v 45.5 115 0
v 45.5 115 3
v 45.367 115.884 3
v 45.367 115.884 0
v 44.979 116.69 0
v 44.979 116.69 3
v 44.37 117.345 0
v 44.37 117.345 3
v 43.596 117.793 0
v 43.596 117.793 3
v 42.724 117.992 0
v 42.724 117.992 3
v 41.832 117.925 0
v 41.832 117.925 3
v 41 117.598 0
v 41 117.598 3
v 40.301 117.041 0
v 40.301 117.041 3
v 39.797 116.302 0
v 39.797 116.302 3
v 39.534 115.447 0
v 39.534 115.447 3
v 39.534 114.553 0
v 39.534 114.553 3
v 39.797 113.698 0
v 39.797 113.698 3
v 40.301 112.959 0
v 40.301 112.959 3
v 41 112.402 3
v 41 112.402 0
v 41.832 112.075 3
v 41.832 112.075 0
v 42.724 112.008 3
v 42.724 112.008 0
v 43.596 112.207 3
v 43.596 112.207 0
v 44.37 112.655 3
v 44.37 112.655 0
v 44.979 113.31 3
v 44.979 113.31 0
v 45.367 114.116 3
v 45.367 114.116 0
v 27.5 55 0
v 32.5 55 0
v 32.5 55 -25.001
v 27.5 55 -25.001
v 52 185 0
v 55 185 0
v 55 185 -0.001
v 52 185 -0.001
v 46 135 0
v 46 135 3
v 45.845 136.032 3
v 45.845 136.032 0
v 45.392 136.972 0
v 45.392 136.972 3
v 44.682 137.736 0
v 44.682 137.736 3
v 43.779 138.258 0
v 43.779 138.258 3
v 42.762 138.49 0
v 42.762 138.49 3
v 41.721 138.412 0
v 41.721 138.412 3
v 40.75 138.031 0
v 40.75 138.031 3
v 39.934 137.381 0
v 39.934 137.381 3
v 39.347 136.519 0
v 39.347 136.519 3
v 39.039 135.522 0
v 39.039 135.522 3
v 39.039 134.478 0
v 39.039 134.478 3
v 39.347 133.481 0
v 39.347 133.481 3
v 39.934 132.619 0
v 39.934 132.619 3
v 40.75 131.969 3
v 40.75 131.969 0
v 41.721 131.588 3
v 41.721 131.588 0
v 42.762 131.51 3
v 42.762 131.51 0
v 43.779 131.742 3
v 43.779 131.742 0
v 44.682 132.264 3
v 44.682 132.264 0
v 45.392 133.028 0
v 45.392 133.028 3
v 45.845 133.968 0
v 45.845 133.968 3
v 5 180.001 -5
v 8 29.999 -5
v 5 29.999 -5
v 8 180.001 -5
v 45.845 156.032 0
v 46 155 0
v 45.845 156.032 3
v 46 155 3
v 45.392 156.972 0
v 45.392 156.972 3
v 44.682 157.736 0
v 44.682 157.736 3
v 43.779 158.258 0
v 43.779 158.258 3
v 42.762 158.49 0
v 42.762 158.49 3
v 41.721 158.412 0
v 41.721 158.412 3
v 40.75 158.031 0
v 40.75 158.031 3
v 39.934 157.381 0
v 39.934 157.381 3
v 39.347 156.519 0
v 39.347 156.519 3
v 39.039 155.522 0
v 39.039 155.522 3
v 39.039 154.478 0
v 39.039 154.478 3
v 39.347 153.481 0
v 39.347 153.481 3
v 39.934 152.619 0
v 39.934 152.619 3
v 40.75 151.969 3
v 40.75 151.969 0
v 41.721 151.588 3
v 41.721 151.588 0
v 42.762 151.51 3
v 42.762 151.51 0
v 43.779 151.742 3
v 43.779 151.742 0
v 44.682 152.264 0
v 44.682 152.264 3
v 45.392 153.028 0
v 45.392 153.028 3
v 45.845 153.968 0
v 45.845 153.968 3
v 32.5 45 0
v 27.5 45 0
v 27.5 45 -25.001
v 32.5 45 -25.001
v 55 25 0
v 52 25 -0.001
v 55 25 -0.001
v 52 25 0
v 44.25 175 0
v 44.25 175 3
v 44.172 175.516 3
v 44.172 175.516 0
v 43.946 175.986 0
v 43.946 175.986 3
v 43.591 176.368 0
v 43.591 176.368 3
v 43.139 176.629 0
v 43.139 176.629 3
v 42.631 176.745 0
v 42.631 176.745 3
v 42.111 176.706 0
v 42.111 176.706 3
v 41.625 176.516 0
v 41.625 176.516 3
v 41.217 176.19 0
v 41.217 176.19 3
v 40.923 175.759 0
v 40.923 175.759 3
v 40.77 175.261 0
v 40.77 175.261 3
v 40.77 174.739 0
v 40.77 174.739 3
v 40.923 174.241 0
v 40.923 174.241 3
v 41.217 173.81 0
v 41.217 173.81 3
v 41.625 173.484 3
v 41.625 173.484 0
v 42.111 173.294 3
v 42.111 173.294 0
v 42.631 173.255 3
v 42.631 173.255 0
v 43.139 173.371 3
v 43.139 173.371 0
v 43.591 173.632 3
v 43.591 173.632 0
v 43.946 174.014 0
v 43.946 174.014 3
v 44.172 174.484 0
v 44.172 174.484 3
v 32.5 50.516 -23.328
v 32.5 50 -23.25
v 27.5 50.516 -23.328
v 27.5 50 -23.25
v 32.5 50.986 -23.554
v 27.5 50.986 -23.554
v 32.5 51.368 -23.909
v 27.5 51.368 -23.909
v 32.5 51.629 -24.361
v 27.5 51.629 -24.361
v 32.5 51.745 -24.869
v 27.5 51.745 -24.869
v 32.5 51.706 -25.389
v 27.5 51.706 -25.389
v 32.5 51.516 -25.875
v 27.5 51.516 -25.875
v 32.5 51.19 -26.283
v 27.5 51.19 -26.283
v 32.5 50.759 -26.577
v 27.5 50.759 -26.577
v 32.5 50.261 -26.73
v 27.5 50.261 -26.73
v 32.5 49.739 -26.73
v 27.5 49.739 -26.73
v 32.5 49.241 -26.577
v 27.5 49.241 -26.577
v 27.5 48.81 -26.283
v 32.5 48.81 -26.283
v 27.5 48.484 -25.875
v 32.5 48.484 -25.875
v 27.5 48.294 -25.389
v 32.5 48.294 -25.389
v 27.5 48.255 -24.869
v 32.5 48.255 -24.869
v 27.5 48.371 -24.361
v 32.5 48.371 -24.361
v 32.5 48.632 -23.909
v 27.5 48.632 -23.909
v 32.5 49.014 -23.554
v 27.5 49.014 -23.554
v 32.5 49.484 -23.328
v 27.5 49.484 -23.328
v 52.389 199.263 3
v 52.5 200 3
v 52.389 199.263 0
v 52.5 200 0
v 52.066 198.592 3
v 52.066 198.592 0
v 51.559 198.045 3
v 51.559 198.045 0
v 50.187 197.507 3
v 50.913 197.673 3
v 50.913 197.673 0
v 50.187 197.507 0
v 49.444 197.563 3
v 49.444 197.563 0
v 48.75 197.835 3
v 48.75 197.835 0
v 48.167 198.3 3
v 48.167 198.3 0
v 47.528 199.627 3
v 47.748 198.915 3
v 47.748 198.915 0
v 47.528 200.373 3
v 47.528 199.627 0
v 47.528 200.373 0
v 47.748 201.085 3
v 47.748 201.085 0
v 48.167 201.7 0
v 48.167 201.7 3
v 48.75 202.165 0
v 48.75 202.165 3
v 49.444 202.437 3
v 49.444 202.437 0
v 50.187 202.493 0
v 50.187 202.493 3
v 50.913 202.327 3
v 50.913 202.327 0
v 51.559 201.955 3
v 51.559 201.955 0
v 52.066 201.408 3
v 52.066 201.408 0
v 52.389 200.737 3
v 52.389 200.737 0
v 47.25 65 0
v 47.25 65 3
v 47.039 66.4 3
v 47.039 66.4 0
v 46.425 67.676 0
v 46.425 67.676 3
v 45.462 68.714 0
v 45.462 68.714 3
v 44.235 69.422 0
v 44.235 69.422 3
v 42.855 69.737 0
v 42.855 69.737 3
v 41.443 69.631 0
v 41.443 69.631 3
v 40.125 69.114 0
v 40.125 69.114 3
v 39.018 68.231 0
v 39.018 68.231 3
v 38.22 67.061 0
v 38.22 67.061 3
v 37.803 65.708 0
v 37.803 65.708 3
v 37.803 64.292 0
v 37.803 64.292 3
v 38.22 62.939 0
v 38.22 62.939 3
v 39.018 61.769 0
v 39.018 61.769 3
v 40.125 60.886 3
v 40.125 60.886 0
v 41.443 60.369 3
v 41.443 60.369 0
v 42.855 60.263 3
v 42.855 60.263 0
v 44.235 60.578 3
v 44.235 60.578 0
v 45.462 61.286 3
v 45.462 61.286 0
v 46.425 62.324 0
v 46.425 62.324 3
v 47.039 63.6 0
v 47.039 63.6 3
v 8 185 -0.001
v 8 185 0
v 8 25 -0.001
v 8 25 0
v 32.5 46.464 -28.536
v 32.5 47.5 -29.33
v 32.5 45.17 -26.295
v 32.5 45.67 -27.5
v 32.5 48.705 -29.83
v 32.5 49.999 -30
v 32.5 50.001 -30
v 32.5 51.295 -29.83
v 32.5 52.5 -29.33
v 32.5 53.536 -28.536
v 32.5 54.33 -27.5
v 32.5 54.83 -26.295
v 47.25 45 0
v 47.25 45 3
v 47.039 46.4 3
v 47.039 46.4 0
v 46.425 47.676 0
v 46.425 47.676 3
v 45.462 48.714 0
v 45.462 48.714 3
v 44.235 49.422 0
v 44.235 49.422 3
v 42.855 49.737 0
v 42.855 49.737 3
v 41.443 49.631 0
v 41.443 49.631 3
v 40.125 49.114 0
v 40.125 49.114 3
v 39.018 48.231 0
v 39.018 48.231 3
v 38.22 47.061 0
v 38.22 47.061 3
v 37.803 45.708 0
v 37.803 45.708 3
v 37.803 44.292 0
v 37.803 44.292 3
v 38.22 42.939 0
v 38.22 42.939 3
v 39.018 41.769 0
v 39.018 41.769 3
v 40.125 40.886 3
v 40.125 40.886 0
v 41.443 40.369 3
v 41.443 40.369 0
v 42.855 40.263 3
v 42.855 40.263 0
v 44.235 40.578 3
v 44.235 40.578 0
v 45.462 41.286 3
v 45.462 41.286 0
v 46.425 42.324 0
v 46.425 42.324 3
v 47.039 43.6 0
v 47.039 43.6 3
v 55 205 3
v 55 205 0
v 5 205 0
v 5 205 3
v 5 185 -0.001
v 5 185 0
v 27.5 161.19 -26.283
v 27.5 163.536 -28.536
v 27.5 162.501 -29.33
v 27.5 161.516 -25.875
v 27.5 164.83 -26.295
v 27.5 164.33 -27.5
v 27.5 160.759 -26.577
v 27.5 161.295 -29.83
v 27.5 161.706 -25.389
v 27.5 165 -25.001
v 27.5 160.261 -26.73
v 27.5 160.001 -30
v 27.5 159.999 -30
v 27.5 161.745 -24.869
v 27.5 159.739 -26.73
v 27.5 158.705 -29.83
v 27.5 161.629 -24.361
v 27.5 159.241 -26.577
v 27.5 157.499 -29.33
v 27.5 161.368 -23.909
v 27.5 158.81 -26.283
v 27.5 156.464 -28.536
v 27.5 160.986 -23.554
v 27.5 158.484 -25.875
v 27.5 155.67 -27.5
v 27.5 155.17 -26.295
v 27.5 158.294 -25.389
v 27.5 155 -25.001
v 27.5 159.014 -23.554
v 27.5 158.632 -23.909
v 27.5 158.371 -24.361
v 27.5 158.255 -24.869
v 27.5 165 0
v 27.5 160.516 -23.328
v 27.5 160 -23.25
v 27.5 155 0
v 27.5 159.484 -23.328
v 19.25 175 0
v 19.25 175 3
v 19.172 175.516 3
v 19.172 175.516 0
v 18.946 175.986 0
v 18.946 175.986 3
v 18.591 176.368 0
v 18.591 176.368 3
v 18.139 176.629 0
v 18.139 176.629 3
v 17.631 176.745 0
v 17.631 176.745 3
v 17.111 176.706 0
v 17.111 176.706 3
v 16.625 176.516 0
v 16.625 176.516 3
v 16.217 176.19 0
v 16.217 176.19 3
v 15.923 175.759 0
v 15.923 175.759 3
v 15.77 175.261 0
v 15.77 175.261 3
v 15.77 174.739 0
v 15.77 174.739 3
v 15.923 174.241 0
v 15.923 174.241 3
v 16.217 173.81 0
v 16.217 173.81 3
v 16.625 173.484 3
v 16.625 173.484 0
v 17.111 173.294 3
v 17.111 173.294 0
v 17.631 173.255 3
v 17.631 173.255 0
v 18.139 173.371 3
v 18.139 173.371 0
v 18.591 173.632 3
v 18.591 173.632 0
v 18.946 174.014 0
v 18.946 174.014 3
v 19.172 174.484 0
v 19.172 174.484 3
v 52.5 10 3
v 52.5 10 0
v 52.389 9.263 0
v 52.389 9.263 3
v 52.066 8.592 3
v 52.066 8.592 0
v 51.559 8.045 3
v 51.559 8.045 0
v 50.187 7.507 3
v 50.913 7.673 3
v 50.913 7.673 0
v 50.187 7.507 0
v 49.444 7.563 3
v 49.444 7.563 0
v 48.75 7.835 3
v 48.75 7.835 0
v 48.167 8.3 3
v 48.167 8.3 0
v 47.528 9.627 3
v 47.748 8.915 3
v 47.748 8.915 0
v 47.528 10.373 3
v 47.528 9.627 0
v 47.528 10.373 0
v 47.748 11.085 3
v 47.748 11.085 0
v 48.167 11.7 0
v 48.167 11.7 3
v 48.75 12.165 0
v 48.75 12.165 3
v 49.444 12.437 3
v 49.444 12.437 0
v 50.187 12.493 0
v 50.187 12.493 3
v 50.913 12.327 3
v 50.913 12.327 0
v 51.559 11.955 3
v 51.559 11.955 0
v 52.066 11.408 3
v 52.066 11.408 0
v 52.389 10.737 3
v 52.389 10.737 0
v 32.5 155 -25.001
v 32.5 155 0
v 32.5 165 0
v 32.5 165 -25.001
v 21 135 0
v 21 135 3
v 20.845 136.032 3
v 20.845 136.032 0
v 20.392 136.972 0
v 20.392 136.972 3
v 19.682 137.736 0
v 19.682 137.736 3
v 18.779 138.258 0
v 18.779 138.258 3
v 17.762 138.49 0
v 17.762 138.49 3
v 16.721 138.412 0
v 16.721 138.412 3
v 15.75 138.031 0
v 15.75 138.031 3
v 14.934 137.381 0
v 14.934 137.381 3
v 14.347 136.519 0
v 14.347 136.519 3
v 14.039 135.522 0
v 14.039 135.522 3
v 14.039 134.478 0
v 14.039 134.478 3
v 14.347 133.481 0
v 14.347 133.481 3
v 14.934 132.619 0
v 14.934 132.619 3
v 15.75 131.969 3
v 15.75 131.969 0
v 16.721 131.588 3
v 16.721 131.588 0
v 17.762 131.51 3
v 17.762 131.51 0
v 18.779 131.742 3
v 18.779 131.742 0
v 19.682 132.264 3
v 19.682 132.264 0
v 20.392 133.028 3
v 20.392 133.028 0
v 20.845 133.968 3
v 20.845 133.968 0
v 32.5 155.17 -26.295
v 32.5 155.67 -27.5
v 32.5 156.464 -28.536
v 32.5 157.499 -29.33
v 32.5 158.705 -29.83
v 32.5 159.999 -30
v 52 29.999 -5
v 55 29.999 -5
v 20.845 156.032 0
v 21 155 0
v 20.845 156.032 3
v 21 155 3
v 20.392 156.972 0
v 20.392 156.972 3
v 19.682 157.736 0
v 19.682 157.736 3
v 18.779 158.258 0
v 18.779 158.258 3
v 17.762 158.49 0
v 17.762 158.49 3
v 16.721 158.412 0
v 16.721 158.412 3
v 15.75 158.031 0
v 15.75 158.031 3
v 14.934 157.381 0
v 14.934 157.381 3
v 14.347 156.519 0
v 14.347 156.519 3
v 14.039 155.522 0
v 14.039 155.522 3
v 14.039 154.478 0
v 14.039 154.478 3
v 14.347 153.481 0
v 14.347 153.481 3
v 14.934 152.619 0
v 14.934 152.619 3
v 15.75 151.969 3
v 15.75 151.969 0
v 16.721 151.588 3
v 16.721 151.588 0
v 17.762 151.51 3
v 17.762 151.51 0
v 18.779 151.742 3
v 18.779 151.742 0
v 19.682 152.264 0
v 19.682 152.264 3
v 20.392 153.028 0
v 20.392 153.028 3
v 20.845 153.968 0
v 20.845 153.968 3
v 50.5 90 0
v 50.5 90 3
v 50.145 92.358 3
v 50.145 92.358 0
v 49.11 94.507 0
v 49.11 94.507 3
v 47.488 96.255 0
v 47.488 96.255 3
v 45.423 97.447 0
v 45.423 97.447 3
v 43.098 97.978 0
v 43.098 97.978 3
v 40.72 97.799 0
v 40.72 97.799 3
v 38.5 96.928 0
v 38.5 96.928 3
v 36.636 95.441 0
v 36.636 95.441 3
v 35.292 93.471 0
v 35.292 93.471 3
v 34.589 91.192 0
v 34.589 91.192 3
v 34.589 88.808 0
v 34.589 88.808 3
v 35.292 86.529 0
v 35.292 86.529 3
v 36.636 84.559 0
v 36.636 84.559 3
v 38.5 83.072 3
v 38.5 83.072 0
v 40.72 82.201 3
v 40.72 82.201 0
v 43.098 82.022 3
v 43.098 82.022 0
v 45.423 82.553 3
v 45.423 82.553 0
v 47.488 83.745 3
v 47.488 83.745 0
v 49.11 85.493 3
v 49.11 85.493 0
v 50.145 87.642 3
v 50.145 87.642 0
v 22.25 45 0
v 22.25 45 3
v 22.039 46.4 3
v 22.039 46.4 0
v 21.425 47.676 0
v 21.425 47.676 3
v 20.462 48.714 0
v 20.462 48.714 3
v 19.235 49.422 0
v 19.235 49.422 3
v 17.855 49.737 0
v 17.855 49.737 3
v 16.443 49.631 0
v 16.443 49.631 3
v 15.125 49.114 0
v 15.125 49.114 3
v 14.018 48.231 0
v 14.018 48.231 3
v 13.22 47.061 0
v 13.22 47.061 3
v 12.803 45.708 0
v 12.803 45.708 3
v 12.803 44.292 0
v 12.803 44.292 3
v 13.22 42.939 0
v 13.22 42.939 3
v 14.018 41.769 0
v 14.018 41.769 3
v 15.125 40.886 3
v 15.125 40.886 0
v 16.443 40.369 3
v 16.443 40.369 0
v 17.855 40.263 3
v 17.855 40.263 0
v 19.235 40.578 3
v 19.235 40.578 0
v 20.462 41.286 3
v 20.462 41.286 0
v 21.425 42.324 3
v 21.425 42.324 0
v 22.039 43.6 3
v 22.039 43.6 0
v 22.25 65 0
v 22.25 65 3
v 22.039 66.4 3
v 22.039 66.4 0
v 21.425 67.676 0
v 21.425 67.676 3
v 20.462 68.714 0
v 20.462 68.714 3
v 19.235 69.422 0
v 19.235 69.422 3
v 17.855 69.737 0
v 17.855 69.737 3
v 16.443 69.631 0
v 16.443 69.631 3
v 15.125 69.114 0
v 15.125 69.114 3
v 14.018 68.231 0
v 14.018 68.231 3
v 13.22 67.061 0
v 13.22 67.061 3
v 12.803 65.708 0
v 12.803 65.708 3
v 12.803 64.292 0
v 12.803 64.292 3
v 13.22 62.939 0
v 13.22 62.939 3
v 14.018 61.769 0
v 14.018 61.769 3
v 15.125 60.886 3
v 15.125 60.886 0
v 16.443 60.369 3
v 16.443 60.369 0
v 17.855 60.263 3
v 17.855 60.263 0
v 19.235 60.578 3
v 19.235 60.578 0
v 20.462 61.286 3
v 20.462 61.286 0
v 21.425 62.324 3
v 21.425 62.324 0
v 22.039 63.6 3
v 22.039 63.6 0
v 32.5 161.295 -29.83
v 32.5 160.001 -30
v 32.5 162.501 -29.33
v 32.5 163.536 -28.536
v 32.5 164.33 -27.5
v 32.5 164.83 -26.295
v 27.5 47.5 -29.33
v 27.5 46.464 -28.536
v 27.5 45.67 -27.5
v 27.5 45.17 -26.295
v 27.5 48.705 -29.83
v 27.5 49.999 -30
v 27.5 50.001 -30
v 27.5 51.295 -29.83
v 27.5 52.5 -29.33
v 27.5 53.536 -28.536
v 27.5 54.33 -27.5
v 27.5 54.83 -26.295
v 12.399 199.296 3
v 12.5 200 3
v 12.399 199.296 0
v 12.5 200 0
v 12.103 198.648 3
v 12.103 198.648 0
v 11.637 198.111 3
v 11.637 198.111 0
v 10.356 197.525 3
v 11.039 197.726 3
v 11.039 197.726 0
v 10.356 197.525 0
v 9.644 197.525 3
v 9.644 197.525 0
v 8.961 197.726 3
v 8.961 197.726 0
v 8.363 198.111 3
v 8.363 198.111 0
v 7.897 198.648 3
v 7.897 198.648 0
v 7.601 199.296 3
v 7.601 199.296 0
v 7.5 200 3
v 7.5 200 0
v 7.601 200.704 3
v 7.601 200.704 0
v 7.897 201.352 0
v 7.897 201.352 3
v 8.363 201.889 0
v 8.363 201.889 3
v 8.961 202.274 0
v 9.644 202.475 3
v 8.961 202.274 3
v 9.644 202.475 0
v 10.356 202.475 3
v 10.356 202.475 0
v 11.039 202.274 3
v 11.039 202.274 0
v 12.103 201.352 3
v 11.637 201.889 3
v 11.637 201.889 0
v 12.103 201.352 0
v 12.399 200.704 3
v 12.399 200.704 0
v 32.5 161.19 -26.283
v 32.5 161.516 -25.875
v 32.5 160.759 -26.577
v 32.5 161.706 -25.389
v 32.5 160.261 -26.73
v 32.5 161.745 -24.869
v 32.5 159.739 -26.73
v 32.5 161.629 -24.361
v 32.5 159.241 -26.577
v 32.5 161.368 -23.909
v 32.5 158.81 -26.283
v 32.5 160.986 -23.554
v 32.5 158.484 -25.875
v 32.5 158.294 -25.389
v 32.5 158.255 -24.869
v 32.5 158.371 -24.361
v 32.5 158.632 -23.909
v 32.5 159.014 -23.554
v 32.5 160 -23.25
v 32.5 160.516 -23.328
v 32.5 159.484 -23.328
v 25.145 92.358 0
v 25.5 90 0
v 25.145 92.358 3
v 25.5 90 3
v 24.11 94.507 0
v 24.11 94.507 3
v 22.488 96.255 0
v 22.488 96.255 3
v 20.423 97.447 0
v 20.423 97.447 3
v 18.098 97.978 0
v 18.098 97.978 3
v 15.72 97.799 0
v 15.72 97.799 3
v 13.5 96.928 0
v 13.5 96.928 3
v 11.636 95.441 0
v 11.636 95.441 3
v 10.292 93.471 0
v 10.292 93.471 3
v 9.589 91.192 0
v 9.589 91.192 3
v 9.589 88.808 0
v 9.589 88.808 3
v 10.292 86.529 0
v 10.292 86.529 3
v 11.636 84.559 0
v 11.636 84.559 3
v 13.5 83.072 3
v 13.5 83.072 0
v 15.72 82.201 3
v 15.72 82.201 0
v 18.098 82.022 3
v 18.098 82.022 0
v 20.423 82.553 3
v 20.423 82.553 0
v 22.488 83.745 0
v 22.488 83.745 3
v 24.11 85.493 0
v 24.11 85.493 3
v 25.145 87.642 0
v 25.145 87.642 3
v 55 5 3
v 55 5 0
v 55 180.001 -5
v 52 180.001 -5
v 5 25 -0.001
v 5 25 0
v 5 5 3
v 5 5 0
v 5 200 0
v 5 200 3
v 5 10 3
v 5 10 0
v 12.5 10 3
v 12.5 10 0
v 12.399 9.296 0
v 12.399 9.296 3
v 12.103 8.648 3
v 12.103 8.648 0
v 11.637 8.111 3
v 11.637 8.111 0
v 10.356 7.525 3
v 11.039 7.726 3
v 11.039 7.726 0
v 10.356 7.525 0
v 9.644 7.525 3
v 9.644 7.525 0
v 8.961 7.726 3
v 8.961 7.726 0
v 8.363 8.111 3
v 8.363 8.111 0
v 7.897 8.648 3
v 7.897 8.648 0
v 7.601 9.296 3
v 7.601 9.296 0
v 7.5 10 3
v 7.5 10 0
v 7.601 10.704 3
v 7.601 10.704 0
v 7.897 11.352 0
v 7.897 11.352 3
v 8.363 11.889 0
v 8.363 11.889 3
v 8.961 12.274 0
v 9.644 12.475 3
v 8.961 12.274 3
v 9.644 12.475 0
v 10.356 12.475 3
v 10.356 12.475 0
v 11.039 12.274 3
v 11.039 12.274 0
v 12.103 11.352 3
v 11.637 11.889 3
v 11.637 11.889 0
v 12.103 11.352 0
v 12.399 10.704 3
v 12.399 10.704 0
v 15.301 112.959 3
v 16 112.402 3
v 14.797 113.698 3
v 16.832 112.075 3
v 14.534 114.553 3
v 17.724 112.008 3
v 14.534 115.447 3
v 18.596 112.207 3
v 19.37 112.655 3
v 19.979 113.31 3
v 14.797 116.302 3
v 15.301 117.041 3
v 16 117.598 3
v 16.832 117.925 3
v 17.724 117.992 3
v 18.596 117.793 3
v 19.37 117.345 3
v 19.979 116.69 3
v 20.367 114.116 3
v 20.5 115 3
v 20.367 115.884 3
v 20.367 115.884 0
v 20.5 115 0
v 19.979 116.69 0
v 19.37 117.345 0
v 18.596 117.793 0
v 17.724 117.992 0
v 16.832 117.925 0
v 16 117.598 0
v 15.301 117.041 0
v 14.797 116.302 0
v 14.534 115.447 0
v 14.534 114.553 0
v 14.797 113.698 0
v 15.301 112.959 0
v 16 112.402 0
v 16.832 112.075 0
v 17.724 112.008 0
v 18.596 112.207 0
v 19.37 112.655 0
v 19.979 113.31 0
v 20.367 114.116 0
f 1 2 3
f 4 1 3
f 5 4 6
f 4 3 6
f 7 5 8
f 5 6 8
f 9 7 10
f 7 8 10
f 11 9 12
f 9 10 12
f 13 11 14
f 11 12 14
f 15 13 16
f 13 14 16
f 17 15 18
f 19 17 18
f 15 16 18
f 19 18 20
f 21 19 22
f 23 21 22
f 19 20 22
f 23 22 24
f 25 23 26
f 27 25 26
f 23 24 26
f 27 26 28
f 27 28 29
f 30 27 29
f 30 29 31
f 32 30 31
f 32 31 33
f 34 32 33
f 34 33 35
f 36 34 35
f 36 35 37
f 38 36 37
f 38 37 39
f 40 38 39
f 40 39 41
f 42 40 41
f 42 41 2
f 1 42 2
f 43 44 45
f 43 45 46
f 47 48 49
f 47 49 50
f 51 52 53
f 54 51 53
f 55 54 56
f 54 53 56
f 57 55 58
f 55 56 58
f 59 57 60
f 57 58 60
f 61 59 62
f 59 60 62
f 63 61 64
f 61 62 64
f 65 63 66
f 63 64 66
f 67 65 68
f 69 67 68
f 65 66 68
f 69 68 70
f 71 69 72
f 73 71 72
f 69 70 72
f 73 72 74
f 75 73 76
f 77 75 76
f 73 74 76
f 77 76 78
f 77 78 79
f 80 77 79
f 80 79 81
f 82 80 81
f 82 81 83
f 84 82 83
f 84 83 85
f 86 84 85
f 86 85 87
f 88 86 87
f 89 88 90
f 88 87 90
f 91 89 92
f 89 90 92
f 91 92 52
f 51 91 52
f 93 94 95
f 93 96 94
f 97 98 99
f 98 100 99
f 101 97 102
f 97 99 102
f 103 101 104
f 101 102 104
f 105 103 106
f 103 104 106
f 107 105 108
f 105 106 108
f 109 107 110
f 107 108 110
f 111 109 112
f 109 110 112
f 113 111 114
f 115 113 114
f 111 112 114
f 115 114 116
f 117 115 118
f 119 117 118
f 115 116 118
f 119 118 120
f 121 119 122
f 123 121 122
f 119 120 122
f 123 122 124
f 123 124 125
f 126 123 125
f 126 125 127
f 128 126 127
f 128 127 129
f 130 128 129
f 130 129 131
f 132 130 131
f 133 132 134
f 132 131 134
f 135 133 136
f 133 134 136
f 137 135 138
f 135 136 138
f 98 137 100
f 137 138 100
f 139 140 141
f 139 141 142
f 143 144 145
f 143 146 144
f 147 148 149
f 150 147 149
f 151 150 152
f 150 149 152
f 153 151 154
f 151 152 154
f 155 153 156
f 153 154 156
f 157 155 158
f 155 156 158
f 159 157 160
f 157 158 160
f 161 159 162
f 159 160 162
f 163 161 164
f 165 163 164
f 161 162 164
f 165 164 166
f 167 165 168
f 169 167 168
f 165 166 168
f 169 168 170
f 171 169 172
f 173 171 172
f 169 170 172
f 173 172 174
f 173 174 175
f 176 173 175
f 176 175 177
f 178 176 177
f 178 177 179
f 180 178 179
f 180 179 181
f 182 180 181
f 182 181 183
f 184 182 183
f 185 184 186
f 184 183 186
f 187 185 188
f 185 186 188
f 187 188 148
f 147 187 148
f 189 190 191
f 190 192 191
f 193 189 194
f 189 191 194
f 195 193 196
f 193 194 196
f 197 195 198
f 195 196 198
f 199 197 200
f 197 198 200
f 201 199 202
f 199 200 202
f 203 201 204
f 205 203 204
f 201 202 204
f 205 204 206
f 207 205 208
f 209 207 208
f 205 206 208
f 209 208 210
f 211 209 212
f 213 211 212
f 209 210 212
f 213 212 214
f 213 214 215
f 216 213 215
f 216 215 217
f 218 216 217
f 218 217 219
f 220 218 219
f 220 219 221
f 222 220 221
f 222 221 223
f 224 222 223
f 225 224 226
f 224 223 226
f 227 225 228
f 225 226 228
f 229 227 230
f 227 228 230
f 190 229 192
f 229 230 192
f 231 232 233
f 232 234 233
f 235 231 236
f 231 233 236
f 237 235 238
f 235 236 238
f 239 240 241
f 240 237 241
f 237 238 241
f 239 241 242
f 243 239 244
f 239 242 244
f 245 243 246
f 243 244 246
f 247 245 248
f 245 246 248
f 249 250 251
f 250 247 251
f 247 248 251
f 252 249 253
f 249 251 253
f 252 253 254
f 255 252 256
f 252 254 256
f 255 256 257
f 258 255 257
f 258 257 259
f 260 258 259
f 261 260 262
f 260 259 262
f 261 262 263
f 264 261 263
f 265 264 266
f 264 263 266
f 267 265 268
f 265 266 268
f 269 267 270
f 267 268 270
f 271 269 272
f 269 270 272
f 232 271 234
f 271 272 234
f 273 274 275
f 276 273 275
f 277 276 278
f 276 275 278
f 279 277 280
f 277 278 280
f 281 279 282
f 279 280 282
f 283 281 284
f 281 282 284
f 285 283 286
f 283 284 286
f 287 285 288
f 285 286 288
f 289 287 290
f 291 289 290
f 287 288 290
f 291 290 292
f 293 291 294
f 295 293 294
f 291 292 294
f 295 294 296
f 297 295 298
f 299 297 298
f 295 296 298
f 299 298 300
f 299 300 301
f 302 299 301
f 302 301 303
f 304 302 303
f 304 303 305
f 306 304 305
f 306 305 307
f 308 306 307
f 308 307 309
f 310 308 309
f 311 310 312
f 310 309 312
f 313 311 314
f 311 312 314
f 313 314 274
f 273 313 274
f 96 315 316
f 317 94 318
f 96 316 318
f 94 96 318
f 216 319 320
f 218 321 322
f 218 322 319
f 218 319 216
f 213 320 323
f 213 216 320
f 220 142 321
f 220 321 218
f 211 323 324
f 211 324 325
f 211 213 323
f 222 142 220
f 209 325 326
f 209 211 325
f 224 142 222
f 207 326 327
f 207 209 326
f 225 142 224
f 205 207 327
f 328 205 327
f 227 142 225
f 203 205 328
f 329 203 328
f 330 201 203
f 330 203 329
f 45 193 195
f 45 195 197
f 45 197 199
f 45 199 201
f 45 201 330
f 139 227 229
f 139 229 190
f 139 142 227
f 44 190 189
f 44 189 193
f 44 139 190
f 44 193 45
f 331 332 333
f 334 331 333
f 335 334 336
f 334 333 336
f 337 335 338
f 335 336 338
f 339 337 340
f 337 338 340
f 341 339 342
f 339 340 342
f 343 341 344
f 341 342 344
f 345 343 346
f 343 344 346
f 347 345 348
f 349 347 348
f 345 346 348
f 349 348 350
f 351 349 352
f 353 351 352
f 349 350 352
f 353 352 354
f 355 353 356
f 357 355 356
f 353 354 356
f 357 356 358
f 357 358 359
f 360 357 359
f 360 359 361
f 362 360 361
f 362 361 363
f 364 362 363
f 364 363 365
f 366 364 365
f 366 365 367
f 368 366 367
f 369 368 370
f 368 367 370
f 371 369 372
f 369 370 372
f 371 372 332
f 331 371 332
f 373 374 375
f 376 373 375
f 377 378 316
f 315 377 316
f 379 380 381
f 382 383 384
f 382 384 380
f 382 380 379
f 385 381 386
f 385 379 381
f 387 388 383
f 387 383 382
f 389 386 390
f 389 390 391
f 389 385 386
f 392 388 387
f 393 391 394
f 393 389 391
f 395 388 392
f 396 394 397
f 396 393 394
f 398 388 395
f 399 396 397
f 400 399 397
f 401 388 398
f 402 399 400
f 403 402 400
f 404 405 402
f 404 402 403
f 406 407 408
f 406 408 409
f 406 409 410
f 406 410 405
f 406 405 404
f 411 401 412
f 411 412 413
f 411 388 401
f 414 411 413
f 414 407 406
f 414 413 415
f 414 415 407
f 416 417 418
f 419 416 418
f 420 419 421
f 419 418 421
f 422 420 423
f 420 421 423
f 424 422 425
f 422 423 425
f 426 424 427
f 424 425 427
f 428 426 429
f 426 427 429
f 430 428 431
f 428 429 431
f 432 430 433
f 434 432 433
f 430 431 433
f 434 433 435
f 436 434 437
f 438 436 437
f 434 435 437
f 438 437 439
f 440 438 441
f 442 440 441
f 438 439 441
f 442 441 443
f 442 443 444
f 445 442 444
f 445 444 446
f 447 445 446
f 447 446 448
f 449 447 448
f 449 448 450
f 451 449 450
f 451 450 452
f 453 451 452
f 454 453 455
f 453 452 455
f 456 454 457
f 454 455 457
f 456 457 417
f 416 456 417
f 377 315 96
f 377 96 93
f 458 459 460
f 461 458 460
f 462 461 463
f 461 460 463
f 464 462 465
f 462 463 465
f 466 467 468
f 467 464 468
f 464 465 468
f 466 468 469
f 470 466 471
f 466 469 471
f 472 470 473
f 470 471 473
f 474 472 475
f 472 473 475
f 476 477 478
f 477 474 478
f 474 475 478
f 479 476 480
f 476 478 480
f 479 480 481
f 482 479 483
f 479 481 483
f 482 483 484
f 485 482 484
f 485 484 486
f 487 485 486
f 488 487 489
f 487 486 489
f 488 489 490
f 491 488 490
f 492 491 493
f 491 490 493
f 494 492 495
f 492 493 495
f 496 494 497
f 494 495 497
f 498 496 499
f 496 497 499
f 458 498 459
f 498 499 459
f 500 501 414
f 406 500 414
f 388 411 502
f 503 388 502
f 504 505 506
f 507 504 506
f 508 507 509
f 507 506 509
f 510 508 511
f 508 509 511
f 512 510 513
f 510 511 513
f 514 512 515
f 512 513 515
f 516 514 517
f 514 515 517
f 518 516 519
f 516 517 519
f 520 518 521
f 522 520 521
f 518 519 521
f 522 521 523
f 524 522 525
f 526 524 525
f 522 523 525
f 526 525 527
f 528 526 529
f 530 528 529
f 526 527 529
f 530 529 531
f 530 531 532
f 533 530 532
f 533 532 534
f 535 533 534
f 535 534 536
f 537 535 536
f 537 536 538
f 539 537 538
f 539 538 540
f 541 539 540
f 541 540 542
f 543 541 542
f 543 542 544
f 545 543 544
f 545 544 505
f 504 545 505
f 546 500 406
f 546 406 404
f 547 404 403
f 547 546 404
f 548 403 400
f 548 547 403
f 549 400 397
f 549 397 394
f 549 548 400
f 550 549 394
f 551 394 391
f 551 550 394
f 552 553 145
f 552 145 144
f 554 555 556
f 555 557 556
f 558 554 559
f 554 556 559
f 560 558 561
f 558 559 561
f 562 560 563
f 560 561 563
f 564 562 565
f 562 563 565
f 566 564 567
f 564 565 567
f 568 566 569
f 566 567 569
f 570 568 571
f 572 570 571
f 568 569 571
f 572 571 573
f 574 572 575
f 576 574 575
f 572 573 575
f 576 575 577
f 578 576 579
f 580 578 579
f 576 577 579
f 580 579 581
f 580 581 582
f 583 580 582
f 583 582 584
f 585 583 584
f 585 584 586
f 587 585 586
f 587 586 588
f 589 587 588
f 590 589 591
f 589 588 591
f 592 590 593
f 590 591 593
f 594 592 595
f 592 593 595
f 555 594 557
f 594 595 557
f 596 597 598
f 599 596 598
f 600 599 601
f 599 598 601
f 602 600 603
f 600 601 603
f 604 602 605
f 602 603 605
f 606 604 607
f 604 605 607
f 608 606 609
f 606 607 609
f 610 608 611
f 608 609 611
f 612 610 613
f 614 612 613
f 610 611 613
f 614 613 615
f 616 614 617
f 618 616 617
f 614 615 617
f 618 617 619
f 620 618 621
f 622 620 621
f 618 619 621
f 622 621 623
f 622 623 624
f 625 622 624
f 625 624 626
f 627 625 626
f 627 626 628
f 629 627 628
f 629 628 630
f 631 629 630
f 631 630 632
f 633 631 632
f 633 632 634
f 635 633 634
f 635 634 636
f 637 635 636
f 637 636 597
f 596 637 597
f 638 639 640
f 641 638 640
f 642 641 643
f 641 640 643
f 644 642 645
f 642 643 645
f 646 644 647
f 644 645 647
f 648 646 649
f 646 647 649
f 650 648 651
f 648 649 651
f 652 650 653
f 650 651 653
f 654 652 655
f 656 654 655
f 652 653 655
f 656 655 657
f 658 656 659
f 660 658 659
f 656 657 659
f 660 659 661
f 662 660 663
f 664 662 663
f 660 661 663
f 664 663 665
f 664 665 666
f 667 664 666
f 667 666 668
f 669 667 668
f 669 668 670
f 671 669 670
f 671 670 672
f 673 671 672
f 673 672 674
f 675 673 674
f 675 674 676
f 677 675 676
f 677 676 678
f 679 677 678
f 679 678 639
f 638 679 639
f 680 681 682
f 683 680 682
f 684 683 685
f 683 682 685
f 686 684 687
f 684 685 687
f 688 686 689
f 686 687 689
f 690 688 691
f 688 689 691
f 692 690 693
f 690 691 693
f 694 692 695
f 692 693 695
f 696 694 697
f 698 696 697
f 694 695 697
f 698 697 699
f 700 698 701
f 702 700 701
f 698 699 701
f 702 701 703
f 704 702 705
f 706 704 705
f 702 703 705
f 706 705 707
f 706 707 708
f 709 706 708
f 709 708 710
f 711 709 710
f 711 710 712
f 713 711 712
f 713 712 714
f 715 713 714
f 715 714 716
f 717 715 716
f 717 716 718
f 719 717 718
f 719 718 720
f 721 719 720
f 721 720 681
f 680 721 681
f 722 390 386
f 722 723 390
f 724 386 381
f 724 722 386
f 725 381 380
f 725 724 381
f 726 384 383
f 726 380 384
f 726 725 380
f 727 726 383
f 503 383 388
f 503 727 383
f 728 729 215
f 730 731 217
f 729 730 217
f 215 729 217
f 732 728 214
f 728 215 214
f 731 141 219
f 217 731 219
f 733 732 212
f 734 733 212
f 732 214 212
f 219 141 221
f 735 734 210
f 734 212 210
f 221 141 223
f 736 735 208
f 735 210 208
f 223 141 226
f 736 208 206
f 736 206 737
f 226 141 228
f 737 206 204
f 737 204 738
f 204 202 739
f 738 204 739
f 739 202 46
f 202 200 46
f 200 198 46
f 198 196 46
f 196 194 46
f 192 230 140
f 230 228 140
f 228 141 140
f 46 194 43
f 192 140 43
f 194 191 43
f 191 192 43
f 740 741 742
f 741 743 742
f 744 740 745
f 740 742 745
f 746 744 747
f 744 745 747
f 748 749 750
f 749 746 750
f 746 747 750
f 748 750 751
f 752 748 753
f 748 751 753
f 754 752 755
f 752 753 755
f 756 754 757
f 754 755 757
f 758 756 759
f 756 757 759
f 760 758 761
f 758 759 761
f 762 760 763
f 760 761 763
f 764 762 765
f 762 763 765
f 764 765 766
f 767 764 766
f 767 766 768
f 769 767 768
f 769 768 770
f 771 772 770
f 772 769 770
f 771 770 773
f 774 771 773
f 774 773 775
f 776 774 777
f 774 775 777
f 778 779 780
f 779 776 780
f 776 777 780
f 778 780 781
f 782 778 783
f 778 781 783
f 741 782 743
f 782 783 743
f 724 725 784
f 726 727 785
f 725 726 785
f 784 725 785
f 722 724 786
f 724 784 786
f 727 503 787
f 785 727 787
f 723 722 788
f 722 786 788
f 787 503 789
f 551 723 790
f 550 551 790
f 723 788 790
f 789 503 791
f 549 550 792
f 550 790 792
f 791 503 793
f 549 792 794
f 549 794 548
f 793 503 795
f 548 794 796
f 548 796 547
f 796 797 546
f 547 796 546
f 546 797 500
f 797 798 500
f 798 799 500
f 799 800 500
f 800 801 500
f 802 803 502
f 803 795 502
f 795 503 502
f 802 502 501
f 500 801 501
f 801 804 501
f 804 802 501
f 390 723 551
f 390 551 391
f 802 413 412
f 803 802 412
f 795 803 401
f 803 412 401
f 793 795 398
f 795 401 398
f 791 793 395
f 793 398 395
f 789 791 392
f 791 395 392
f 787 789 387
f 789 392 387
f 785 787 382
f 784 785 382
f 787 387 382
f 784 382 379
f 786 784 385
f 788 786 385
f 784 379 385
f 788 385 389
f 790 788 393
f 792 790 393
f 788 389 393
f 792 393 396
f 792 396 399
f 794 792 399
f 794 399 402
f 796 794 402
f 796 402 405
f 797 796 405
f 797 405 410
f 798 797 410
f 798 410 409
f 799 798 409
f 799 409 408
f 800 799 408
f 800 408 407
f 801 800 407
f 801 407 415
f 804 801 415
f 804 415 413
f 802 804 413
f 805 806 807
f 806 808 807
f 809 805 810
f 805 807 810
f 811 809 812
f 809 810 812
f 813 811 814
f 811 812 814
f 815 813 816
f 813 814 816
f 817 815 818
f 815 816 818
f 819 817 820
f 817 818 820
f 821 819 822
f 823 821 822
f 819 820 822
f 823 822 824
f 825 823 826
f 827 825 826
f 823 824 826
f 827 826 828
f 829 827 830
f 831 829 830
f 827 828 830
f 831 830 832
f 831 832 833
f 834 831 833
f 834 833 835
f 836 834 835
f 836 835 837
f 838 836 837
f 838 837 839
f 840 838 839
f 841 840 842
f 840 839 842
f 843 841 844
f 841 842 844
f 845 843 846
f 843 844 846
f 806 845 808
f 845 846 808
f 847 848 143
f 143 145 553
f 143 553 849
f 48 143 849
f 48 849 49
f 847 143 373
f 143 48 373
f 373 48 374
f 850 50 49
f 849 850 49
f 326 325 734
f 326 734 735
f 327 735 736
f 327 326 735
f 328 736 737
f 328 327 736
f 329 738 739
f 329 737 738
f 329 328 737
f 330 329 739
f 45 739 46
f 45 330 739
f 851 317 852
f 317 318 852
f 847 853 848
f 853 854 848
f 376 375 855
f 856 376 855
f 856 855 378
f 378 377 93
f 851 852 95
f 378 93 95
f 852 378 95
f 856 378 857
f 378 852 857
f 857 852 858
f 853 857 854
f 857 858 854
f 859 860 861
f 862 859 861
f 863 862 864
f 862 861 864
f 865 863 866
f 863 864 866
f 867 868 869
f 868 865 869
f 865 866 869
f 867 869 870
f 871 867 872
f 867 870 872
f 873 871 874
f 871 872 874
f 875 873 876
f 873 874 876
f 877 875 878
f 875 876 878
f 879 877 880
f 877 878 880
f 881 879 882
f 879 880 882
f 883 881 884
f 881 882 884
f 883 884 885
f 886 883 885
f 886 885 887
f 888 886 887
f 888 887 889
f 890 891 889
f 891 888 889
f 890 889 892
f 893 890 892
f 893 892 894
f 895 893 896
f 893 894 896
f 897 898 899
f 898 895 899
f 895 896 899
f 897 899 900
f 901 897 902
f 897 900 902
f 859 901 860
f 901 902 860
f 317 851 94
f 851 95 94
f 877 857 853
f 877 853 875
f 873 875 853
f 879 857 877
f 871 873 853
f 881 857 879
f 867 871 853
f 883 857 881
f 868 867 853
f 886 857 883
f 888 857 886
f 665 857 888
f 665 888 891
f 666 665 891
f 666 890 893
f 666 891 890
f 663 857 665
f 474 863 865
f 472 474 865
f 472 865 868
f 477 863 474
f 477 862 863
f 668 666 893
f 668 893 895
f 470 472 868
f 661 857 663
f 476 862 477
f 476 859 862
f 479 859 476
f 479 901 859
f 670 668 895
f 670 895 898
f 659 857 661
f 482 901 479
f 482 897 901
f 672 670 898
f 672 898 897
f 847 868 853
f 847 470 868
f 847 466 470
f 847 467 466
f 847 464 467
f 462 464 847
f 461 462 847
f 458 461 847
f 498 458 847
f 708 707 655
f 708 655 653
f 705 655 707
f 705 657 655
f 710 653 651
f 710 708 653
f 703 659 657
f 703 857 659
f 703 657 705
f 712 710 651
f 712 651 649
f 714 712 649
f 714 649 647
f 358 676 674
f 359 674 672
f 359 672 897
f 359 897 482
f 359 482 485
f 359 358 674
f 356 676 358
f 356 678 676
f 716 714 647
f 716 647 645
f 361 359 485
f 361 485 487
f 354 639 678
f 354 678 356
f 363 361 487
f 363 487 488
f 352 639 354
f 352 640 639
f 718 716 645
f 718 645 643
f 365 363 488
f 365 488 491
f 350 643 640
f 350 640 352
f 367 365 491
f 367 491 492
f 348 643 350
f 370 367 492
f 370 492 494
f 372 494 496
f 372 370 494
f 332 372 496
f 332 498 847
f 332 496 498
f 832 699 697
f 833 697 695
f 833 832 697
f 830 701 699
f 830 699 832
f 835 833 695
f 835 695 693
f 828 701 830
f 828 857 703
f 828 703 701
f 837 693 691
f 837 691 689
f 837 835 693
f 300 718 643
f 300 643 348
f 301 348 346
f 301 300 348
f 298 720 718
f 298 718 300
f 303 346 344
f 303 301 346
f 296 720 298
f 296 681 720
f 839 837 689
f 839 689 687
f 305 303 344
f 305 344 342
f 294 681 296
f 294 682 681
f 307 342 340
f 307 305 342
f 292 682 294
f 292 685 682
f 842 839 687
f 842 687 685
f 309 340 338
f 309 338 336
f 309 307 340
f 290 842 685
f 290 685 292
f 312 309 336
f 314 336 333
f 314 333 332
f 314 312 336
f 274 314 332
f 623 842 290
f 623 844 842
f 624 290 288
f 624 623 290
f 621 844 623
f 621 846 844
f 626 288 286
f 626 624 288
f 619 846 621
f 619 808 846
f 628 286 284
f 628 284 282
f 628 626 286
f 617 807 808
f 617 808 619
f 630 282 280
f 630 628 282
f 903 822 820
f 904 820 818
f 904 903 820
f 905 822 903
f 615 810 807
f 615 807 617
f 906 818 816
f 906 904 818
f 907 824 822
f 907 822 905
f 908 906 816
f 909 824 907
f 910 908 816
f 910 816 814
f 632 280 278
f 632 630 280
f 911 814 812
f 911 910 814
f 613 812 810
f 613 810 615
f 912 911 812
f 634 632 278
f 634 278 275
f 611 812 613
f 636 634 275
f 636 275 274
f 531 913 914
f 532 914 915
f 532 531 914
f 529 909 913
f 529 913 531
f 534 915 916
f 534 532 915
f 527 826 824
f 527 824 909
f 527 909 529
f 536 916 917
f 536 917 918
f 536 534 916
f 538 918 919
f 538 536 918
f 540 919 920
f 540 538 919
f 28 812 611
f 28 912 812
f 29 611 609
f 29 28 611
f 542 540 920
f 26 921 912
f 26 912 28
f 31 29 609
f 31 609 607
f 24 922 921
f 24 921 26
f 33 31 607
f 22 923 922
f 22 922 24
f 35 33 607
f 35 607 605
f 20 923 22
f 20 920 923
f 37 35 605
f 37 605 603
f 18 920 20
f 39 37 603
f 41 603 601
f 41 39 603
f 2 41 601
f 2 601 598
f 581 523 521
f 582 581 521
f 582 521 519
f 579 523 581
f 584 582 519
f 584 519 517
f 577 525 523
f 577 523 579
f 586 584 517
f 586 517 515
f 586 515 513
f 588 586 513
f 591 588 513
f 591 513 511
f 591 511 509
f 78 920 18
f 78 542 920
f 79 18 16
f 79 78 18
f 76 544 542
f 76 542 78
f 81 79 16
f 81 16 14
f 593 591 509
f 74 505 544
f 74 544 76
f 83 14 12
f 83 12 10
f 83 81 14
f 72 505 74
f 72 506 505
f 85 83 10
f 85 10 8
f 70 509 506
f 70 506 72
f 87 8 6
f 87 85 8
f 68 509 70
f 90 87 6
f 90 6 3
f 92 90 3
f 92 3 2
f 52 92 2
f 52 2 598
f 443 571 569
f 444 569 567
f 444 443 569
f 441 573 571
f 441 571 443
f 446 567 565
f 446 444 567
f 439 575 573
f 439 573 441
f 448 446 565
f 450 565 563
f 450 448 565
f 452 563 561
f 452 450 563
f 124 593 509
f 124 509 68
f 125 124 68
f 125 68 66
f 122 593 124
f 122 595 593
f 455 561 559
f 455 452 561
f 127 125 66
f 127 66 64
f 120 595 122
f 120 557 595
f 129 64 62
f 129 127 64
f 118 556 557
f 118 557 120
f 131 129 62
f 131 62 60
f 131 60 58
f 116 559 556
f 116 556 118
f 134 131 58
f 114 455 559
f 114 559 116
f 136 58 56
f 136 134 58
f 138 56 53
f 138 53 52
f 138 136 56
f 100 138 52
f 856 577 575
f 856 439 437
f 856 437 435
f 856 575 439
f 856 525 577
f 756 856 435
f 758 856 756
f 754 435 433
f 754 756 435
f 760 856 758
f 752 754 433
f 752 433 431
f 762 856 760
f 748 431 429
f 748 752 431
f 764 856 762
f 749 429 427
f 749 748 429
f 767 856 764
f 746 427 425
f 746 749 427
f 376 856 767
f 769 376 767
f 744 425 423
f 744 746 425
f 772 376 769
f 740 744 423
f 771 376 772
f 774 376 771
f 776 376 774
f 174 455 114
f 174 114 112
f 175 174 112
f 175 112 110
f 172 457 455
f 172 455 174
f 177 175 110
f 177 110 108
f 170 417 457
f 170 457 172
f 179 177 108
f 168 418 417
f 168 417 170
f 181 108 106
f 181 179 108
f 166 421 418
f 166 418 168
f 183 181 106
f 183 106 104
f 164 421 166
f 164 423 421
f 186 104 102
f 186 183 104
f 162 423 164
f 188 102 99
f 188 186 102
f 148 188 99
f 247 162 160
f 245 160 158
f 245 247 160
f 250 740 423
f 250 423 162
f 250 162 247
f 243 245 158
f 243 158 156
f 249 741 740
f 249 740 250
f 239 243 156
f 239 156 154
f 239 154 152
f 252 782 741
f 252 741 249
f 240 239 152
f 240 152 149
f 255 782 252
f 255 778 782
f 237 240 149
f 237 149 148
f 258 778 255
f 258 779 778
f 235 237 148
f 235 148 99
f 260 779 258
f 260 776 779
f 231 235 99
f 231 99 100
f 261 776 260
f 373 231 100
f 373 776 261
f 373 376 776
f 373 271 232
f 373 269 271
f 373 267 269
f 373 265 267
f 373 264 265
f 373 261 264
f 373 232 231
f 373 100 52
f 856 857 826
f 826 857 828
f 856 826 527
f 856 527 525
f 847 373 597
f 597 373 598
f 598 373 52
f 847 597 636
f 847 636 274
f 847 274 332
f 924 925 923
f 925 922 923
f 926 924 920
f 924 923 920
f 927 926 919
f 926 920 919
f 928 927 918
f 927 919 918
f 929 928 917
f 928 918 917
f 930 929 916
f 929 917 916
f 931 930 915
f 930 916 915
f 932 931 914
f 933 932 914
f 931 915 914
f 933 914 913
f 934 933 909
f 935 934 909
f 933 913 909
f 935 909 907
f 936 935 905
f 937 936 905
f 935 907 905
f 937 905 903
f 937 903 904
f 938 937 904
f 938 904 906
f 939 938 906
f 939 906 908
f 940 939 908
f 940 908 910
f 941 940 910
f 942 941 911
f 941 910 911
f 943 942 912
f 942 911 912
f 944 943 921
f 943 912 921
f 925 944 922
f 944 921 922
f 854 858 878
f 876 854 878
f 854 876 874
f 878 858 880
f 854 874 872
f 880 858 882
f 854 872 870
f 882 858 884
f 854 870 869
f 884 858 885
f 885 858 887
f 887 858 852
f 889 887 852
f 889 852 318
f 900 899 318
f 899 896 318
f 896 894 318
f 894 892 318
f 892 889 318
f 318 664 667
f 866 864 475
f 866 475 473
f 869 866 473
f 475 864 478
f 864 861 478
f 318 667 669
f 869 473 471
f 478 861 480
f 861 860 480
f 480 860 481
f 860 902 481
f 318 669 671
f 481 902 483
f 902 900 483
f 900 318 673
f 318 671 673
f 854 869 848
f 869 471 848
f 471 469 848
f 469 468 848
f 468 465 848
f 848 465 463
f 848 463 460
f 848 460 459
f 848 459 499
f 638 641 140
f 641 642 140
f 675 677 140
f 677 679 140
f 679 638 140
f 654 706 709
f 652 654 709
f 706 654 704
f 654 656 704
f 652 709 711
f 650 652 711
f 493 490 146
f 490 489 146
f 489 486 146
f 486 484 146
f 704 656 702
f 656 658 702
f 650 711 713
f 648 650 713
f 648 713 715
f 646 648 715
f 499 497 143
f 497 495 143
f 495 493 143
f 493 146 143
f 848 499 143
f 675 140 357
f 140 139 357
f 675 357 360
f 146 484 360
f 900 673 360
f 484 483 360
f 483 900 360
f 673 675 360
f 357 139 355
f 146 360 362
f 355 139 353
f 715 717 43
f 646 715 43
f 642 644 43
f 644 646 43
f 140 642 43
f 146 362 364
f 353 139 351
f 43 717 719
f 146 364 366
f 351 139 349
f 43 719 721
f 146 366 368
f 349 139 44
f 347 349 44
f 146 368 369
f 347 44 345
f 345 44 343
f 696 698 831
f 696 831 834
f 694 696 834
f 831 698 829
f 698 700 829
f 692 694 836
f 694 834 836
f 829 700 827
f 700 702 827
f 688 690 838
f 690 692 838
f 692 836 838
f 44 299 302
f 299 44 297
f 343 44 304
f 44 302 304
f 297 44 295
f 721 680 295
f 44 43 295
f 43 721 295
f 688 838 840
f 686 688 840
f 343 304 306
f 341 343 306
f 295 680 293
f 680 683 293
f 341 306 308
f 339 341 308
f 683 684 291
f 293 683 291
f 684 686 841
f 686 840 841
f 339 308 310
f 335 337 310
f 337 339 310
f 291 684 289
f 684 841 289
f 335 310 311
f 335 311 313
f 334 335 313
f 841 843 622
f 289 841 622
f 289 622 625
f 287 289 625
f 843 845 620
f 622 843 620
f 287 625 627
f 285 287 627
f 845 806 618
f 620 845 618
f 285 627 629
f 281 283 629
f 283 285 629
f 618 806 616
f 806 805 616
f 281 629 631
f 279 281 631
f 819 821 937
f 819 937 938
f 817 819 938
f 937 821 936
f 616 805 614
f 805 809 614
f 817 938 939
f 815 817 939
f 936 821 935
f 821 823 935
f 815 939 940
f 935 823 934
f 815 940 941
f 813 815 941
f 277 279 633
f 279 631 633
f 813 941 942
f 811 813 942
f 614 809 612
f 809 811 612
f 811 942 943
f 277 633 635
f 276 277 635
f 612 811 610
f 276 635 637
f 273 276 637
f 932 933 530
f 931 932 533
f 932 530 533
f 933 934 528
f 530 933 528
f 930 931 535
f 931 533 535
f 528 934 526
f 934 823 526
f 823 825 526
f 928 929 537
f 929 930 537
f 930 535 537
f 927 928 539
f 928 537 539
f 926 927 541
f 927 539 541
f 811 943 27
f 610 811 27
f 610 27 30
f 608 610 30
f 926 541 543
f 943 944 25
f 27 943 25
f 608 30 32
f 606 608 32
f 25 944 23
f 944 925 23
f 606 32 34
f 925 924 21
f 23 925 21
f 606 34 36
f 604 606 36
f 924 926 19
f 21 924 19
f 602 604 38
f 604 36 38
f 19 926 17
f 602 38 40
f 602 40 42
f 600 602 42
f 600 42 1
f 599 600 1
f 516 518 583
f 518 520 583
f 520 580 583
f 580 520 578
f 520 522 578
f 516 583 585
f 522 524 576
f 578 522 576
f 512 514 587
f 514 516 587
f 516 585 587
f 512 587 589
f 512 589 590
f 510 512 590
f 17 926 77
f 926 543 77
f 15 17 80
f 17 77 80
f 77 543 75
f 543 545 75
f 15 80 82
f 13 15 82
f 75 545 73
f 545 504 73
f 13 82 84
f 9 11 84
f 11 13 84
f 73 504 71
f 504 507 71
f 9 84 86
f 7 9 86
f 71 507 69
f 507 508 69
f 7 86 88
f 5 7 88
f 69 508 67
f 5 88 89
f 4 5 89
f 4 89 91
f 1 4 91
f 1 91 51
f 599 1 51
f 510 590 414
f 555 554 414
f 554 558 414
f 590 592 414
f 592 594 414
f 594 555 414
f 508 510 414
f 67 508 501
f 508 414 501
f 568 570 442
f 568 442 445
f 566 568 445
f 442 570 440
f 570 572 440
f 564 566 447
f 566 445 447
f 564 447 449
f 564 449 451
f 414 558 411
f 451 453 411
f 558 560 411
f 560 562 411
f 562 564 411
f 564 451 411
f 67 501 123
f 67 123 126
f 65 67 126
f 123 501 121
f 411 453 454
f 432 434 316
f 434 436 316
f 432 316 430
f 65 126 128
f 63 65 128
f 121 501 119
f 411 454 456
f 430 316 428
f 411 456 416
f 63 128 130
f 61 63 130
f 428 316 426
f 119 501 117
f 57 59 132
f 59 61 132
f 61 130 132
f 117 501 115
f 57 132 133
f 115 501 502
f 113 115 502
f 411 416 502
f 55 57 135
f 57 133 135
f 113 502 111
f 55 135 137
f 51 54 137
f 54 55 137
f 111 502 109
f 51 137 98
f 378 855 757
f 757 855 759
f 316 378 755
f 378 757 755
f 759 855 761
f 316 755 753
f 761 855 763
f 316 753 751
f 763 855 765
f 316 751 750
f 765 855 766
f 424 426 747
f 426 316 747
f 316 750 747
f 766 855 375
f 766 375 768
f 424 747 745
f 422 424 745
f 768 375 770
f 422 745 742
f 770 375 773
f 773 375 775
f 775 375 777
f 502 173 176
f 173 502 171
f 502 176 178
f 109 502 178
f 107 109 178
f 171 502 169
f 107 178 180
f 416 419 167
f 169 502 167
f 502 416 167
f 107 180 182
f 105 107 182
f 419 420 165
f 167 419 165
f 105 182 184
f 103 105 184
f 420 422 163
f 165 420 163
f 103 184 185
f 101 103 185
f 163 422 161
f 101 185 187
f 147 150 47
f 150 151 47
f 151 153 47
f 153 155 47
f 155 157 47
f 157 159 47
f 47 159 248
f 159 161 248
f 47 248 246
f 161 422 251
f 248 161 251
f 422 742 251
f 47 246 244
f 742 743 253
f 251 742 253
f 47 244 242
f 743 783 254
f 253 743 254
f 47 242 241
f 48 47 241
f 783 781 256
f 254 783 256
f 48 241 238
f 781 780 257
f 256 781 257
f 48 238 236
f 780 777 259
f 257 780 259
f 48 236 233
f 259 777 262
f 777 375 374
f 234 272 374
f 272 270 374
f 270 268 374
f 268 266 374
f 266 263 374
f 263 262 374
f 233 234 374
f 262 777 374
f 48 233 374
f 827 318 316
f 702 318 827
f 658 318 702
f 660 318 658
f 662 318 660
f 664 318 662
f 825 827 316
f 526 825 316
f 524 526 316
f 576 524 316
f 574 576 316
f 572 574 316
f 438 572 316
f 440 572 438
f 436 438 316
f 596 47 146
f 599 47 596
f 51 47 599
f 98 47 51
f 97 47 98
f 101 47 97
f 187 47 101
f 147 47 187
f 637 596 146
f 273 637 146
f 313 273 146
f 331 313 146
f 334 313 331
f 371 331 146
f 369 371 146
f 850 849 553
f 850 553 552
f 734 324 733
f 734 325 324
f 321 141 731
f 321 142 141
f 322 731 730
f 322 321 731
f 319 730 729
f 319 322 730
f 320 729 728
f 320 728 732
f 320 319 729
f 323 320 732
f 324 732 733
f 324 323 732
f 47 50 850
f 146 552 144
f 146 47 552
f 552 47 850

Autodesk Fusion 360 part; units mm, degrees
sketch "Sketch1" plane through (0, 0, 0) normal (0, 0, 1) x (1, 0, 0)
  line L0 (5, 5) -> (55, 5)
  line L1 (55, 5) -> (55, 205)
  line L2 (55, 205) -> (5, 205)
  line L3 (5, 205) -> (5, 5)
  line L4 (5, 205) -> (5, 200)
  line L5 (5, 200) -> (10, 200)
  circle A0 centre (10, 200) radius 2.5
  line L6 (5, 5) -> (5, 10)
  line L7 (5, 10) -> (10, 10)
  circle A1 centre (10, 10) radius 2.5
  line L8 (30, 205) -> (30, 5)
  circle A2 centre (50, 200) radius 2.5
  circle A3 centre (50, 10) radius 2.5
  dimension "d1" = 50
  dimension "d2" = 200
  dimension "d3" = 5
  dimension "d4" = 5
extrude "Extrude1" add sketch "Sketch1" along normal blind 3
sketch "Sketch2" plane through (0, 0, 3) normal (0, 0, 1) x (1, 0, 0)
  circle A0 centre (10, 200) radius 2.5
  circle A1 centre (50, 200) radius 2.5
  circle A2 centre (10, 10) radius 2.5
  circle A3 centre (50, 10) radius 2.5
  line L0 (55, 5) -> (55, 205)
  line L1 (55, 205) -> (5, 205)
  line L2 (5, 205) -> (5, 5)
  line L3 (5, 5) -> (55, 5)
  line L4 (5, 205) -> (17.5, 205)
  line L5 (17.5, 205) -> (17.5, 5)
  line L6 (55, 205) -> (42.5, 205)
  line L7 (42.5, 205) -> (42.5, 5)
  line L8 (30, 205) -> (30, 5)
  line L9 (5, 205) -> (5, 185)
  line L10 (5, 5) -> (5, 25)
  line L11 (5, 25) -> (55, 25)
  line L12 (5, 185) -> (55, 185)
  line L13 (17.5, 185) -> (17.5, 175)
  circle A4 centre (17.5, 175) radius 1.75
  line L14 (17.5, 25) -> (17.5, 45)
  circle A5 centre (17.5, 45) radius 4.75
  line L15 (17.5, 45) -> (17.5, 65)
  circle A6 centre (17.5, 65) radius 4.75
  line L16 (17.5, 175) -> (17.5, 155)
  circle A7 centre (17.5, 155) radius 3.5
  line L17 (17.5, 155) -> (17.5, 135)
  circle A8 centre (17.5, 135) radius 3.5
  line L18 (17.5, 135) -> (17.5, 115)
  circle A9 centre (17.5, 115) radius 3
  line L19 (17.5, 115) -> (17.5, 90)
  circle A10 centre (17.5, 90) radius 8
  circle A11 centre (42.5, 175) radius 1.75
  circle A12 centre (42.5, 155) radius 3.5
  circle A13 centre (42.5, 135) radius 3.5
  circle A14 centre (42.5, 115) radius 3
  circle A15 centre (42.5, 90) radius 8
  circle A16 centre (42.5, 65) radius 4.75
  circle A17 centre (42.5, 45) radius 4.75
  dimension "d7" = 12.5
  dimension "d8" = 200
  dimension "d9" = 12.5
  dimension "d10" = 20
  dimension "d11" = 20
  dimension "d12" = 10
  dimension "d13" = 3.5
  dimension "d14" = 20
  dimension "d15" = 9.5
  dimension "d16" = 20
  dimension "d17" = 9.5
  dimension "d18" = 20
  dimension "d19" = 7
  dimension "d20" = 20
  dimension "d21" = 7
  dimension "d22" = 20
  dimension "d23" = 6
  dimension "d24" = 25
  dimension "d25" = 16
extrude "Extrude2" cut sketch "Sketch2" against normal blind 3 contours L7 A17 | L7 A17 | L7 A11 | L7 A11 | L7 A16 | L7 A16 | L5 L14 A5 L15 | L5 L14 A5 L15 | L7 A12 | L7 A12 | L5 L13 A4 L16 | L5 L13 A4 L16 | L7 A15 | L7 A15 | L5 L15 A6 | L5 L15 A6 | L7 A13 | L7 A13 | L5 L16 A7 L17 | L5 L16 A7 L17 | L7 A14 | L7 A14 | L5 L19 A10 | L5 L19 A10 | L5 L17 A8 L18 | L5 L17 A8 L18 | L5 L18 A9 L19 | L5 L18 A9 L19
sketch "Sketch3" plane through (0, 0, 0) normal (0, 0, -1) x (-1, 0, 0)
  circle A0 centre (-42.5, 135) radius 3.5
  circle A1 centre (-42.5, 45) radius 4.75
  circle A2 centre (-17.5, 115) radius 3
  circle A3 centre (-17.5, 155) radius 3.5
  circle A4 centre (-17.5, 90) radius 8
  circle A5 centre (-42.5, 65) radius 4.75
  circle A6 centre (-42.5, 155) radius 3.5
  circle A7 centre (-42.5, 115) radius 3
  circle A8 centre (-17.5, 45) radius 4.75
  circle A9 centre (-17.5, 135) radius 3.5
  circle A10 centre (-17.5, 175) radius 1.75
  circle A11 centre (-17.5, 65) radius 4.75
  circle A12 centre (-42.5, 90) radius 8
  circle A13 centre (-42.5, 175) radius 1.75
  circle A14 centre (-10, 200) radius 2.5
  circle A15 centre (-50, 200) radius 2.5
  circle A16 centre (-10, 10) radius 2.5
  circle A17 centre (-50, 10) radius 2.5
  line L0 (-55, 205) -> (-55, 5)
  line L1 (-55, 5) -> (-5, 5)
  line L2 (-5, 5) -> (-5, 205)
  line L3 (-5, 205) -> (-55, 205)
  line L4 (-55, 205) -> (-55, 185)
  line L5 (-55, 185) -> (-52, 185)
  line L6 (-52, 185) -> (-52, 25)
  line L7 (-52, 25) -> (-55, 25)
  line L8 (-55, 25) -> (-55, 185)
  line L9 (-30, 205) -> (-30, 5)
  line L10 (-5, 25) -> (-5, 185)
  line L11 (-8, 185) -> (-8, 25)
  line L12 (-8, 25) -> (-5, 25)
  line L13 (-5, 185) -> (-8, 185)
  dimension "d28" = 20
  dimension "d29" = 3
  dimension "d30" = 160
extrude "Extrude3" add sketch "Sketch3" along normal blind 5 contours L0 L5 L6 L7 L8 | L2 L10 L11 L12 L13
chamfer "Chamfer1" distance 5 angle 45 4 edges at (6.5, 25, -5) (53.5, 25, -5) (6.5, 185, -5) (53.5, 185, -5)
sketch "Sketch4" plane through (0, 0, 0) normal (1, 0, 0) x (0, 0, -1)
sketch "Sketch5" plane through (0, 0, 0) normal (0, 0, -1) x (-1, 0, 0)
  circle A0 centre (-42.5, 135) radius 3.5
  circle A1 centre (-42.5, 45) radius 4.75
  circle A2 centre (-17.5, 115) radius 3
  circle A3 centre (-17.5, 155) radius 3.5
  circle A4 centre (-17.5, 90) radius 8
  circle A5 centre (-42.5, 65) radius 4.75
  circle A6 centre (-42.5, 155) radius 3.5
  circle A7 centre (-42.5, 115) radius 3
  circle A8 centre (-17.5, 45) radius 4.75
  circle A9 centre (-17.5, 135) radius 3.5
  circle A10 centre (-17.5, 175) radius 1.75
  circle A11 centre (-17.5, 65) radius 4.75
  circle A12 centre (-42.5, 90) radius 8
  circle A13 centre (-42.5, 175) radius 1.75
  circle A14 centre (-10, 200) radius 2.5
  circle A15 centre (-50, 200) radius 2.5
  circle A16 centre (-10, 10) radius 2.5
  circle A17 centre (-50, 10) radius 2.5
  line L0 (-5, 25) -> (-8, 25)
  line L1 (-8, 25) -> (-8, 185)
  line L2 (-8, 185) -> (-5, 185)
  line L3 (-5, 185) -> (-5, 205)
  line L4 (-5, 205) -> (-55, 205)
  line L5 (-55, 205) -> (-55, 185)
  line L6 (-55, 185) -> (-52, 185)
  line L7 (-52, 185) -> (-52, 25)
  line L8 (-52, 25) -> (-55, 25)
  line L9 (-55, 25) -> (-55, 5)
  line L10 (-55, 5) -> (-5, 5)
  line L11 (-5, 5) -> (-5, 25)
  line L12 (-30, 205) -> (-30, 5)
  line L13 (-30, 205) -> (-30, 165)
  line L14 (-30, 5) -> (-30, 50)
  line L15 (-30, 165) -> (-27.5, 165)
  line L16 (-27.5, 165) -> (-27.5, 155)
  line L17 (-27.5, 155) -> (-30, 155)
  line L18 (-30, 155) -> (-30, 165)
  line L19 (-30, 165) -> (-32.5, 165)
  line L20 (-32.5, 165) -> (-32.5, 155)
  line L21 (-32.5, 155) -> (-30, 155)
  line L22 (-30, 155) -> (-30, 165)
  line L23 (-52, 105) -> (-8, 105)
  line L24 (-27.5, 55) -> (-30, 55)
  line L25 (-27.5, 45) -> (-27.5, 55)
  line L26 (-30, 45) -> (-27.5, 45)
  line L27 (-30, 45) -> (-32.5, 45)
  line L28 (-32.5, 45) -> (-32.5, 55)
  line L29 (-32.5, 55) -> (-30, 55)
  dimension "d34" = 40
  dimension "d35" = 45
  dimension "d36" = 2.5
  dimension "d37" = 10
extrude "Extrude4" add sketch "Sketch5" along normal blind 30 contours L12 L14 L27 L28 L29 | L12 L14 L24 L25 L26
extrude "Extrude5" add sketch "Sketch5" along normal blind 30 contours L12 L18 L19 L20 L21 L22 | L12 L15 L16 L17 L18 L22
fillet "Fillet1" radius 5 4 edges at (30, 155, -30) (30, 165, -30) (30, 55, -30) (30, 45, -30)
sketch "Sketch6" plane through (27.5, 0, 0) normal (-1, 0, 0) x (0, 0, 1)
  arc A0 (-25, 165) -> (-25, 155) centre (-25, 160) ccw
  line L0 (-25, 155) -> (0, 155)
  line L1 (0, 155) -> (0, 165)
  line L2 (0, 165) -> (-25, 165)
  line L3 (-30, 160) -> (-25, 160)
  line L4 (-30, 50) -> (-25, 50)
  circle A1 centre (-25, 50) radius 1.75
  circle A2 centre (-25, 160) radius 1.75
  dimension "d43" = 3.5
  dimension "d44" = 3.5
extrude "Extrude6" cut sketch "Sketch6" against normal blind 5 contours A2 | A1
